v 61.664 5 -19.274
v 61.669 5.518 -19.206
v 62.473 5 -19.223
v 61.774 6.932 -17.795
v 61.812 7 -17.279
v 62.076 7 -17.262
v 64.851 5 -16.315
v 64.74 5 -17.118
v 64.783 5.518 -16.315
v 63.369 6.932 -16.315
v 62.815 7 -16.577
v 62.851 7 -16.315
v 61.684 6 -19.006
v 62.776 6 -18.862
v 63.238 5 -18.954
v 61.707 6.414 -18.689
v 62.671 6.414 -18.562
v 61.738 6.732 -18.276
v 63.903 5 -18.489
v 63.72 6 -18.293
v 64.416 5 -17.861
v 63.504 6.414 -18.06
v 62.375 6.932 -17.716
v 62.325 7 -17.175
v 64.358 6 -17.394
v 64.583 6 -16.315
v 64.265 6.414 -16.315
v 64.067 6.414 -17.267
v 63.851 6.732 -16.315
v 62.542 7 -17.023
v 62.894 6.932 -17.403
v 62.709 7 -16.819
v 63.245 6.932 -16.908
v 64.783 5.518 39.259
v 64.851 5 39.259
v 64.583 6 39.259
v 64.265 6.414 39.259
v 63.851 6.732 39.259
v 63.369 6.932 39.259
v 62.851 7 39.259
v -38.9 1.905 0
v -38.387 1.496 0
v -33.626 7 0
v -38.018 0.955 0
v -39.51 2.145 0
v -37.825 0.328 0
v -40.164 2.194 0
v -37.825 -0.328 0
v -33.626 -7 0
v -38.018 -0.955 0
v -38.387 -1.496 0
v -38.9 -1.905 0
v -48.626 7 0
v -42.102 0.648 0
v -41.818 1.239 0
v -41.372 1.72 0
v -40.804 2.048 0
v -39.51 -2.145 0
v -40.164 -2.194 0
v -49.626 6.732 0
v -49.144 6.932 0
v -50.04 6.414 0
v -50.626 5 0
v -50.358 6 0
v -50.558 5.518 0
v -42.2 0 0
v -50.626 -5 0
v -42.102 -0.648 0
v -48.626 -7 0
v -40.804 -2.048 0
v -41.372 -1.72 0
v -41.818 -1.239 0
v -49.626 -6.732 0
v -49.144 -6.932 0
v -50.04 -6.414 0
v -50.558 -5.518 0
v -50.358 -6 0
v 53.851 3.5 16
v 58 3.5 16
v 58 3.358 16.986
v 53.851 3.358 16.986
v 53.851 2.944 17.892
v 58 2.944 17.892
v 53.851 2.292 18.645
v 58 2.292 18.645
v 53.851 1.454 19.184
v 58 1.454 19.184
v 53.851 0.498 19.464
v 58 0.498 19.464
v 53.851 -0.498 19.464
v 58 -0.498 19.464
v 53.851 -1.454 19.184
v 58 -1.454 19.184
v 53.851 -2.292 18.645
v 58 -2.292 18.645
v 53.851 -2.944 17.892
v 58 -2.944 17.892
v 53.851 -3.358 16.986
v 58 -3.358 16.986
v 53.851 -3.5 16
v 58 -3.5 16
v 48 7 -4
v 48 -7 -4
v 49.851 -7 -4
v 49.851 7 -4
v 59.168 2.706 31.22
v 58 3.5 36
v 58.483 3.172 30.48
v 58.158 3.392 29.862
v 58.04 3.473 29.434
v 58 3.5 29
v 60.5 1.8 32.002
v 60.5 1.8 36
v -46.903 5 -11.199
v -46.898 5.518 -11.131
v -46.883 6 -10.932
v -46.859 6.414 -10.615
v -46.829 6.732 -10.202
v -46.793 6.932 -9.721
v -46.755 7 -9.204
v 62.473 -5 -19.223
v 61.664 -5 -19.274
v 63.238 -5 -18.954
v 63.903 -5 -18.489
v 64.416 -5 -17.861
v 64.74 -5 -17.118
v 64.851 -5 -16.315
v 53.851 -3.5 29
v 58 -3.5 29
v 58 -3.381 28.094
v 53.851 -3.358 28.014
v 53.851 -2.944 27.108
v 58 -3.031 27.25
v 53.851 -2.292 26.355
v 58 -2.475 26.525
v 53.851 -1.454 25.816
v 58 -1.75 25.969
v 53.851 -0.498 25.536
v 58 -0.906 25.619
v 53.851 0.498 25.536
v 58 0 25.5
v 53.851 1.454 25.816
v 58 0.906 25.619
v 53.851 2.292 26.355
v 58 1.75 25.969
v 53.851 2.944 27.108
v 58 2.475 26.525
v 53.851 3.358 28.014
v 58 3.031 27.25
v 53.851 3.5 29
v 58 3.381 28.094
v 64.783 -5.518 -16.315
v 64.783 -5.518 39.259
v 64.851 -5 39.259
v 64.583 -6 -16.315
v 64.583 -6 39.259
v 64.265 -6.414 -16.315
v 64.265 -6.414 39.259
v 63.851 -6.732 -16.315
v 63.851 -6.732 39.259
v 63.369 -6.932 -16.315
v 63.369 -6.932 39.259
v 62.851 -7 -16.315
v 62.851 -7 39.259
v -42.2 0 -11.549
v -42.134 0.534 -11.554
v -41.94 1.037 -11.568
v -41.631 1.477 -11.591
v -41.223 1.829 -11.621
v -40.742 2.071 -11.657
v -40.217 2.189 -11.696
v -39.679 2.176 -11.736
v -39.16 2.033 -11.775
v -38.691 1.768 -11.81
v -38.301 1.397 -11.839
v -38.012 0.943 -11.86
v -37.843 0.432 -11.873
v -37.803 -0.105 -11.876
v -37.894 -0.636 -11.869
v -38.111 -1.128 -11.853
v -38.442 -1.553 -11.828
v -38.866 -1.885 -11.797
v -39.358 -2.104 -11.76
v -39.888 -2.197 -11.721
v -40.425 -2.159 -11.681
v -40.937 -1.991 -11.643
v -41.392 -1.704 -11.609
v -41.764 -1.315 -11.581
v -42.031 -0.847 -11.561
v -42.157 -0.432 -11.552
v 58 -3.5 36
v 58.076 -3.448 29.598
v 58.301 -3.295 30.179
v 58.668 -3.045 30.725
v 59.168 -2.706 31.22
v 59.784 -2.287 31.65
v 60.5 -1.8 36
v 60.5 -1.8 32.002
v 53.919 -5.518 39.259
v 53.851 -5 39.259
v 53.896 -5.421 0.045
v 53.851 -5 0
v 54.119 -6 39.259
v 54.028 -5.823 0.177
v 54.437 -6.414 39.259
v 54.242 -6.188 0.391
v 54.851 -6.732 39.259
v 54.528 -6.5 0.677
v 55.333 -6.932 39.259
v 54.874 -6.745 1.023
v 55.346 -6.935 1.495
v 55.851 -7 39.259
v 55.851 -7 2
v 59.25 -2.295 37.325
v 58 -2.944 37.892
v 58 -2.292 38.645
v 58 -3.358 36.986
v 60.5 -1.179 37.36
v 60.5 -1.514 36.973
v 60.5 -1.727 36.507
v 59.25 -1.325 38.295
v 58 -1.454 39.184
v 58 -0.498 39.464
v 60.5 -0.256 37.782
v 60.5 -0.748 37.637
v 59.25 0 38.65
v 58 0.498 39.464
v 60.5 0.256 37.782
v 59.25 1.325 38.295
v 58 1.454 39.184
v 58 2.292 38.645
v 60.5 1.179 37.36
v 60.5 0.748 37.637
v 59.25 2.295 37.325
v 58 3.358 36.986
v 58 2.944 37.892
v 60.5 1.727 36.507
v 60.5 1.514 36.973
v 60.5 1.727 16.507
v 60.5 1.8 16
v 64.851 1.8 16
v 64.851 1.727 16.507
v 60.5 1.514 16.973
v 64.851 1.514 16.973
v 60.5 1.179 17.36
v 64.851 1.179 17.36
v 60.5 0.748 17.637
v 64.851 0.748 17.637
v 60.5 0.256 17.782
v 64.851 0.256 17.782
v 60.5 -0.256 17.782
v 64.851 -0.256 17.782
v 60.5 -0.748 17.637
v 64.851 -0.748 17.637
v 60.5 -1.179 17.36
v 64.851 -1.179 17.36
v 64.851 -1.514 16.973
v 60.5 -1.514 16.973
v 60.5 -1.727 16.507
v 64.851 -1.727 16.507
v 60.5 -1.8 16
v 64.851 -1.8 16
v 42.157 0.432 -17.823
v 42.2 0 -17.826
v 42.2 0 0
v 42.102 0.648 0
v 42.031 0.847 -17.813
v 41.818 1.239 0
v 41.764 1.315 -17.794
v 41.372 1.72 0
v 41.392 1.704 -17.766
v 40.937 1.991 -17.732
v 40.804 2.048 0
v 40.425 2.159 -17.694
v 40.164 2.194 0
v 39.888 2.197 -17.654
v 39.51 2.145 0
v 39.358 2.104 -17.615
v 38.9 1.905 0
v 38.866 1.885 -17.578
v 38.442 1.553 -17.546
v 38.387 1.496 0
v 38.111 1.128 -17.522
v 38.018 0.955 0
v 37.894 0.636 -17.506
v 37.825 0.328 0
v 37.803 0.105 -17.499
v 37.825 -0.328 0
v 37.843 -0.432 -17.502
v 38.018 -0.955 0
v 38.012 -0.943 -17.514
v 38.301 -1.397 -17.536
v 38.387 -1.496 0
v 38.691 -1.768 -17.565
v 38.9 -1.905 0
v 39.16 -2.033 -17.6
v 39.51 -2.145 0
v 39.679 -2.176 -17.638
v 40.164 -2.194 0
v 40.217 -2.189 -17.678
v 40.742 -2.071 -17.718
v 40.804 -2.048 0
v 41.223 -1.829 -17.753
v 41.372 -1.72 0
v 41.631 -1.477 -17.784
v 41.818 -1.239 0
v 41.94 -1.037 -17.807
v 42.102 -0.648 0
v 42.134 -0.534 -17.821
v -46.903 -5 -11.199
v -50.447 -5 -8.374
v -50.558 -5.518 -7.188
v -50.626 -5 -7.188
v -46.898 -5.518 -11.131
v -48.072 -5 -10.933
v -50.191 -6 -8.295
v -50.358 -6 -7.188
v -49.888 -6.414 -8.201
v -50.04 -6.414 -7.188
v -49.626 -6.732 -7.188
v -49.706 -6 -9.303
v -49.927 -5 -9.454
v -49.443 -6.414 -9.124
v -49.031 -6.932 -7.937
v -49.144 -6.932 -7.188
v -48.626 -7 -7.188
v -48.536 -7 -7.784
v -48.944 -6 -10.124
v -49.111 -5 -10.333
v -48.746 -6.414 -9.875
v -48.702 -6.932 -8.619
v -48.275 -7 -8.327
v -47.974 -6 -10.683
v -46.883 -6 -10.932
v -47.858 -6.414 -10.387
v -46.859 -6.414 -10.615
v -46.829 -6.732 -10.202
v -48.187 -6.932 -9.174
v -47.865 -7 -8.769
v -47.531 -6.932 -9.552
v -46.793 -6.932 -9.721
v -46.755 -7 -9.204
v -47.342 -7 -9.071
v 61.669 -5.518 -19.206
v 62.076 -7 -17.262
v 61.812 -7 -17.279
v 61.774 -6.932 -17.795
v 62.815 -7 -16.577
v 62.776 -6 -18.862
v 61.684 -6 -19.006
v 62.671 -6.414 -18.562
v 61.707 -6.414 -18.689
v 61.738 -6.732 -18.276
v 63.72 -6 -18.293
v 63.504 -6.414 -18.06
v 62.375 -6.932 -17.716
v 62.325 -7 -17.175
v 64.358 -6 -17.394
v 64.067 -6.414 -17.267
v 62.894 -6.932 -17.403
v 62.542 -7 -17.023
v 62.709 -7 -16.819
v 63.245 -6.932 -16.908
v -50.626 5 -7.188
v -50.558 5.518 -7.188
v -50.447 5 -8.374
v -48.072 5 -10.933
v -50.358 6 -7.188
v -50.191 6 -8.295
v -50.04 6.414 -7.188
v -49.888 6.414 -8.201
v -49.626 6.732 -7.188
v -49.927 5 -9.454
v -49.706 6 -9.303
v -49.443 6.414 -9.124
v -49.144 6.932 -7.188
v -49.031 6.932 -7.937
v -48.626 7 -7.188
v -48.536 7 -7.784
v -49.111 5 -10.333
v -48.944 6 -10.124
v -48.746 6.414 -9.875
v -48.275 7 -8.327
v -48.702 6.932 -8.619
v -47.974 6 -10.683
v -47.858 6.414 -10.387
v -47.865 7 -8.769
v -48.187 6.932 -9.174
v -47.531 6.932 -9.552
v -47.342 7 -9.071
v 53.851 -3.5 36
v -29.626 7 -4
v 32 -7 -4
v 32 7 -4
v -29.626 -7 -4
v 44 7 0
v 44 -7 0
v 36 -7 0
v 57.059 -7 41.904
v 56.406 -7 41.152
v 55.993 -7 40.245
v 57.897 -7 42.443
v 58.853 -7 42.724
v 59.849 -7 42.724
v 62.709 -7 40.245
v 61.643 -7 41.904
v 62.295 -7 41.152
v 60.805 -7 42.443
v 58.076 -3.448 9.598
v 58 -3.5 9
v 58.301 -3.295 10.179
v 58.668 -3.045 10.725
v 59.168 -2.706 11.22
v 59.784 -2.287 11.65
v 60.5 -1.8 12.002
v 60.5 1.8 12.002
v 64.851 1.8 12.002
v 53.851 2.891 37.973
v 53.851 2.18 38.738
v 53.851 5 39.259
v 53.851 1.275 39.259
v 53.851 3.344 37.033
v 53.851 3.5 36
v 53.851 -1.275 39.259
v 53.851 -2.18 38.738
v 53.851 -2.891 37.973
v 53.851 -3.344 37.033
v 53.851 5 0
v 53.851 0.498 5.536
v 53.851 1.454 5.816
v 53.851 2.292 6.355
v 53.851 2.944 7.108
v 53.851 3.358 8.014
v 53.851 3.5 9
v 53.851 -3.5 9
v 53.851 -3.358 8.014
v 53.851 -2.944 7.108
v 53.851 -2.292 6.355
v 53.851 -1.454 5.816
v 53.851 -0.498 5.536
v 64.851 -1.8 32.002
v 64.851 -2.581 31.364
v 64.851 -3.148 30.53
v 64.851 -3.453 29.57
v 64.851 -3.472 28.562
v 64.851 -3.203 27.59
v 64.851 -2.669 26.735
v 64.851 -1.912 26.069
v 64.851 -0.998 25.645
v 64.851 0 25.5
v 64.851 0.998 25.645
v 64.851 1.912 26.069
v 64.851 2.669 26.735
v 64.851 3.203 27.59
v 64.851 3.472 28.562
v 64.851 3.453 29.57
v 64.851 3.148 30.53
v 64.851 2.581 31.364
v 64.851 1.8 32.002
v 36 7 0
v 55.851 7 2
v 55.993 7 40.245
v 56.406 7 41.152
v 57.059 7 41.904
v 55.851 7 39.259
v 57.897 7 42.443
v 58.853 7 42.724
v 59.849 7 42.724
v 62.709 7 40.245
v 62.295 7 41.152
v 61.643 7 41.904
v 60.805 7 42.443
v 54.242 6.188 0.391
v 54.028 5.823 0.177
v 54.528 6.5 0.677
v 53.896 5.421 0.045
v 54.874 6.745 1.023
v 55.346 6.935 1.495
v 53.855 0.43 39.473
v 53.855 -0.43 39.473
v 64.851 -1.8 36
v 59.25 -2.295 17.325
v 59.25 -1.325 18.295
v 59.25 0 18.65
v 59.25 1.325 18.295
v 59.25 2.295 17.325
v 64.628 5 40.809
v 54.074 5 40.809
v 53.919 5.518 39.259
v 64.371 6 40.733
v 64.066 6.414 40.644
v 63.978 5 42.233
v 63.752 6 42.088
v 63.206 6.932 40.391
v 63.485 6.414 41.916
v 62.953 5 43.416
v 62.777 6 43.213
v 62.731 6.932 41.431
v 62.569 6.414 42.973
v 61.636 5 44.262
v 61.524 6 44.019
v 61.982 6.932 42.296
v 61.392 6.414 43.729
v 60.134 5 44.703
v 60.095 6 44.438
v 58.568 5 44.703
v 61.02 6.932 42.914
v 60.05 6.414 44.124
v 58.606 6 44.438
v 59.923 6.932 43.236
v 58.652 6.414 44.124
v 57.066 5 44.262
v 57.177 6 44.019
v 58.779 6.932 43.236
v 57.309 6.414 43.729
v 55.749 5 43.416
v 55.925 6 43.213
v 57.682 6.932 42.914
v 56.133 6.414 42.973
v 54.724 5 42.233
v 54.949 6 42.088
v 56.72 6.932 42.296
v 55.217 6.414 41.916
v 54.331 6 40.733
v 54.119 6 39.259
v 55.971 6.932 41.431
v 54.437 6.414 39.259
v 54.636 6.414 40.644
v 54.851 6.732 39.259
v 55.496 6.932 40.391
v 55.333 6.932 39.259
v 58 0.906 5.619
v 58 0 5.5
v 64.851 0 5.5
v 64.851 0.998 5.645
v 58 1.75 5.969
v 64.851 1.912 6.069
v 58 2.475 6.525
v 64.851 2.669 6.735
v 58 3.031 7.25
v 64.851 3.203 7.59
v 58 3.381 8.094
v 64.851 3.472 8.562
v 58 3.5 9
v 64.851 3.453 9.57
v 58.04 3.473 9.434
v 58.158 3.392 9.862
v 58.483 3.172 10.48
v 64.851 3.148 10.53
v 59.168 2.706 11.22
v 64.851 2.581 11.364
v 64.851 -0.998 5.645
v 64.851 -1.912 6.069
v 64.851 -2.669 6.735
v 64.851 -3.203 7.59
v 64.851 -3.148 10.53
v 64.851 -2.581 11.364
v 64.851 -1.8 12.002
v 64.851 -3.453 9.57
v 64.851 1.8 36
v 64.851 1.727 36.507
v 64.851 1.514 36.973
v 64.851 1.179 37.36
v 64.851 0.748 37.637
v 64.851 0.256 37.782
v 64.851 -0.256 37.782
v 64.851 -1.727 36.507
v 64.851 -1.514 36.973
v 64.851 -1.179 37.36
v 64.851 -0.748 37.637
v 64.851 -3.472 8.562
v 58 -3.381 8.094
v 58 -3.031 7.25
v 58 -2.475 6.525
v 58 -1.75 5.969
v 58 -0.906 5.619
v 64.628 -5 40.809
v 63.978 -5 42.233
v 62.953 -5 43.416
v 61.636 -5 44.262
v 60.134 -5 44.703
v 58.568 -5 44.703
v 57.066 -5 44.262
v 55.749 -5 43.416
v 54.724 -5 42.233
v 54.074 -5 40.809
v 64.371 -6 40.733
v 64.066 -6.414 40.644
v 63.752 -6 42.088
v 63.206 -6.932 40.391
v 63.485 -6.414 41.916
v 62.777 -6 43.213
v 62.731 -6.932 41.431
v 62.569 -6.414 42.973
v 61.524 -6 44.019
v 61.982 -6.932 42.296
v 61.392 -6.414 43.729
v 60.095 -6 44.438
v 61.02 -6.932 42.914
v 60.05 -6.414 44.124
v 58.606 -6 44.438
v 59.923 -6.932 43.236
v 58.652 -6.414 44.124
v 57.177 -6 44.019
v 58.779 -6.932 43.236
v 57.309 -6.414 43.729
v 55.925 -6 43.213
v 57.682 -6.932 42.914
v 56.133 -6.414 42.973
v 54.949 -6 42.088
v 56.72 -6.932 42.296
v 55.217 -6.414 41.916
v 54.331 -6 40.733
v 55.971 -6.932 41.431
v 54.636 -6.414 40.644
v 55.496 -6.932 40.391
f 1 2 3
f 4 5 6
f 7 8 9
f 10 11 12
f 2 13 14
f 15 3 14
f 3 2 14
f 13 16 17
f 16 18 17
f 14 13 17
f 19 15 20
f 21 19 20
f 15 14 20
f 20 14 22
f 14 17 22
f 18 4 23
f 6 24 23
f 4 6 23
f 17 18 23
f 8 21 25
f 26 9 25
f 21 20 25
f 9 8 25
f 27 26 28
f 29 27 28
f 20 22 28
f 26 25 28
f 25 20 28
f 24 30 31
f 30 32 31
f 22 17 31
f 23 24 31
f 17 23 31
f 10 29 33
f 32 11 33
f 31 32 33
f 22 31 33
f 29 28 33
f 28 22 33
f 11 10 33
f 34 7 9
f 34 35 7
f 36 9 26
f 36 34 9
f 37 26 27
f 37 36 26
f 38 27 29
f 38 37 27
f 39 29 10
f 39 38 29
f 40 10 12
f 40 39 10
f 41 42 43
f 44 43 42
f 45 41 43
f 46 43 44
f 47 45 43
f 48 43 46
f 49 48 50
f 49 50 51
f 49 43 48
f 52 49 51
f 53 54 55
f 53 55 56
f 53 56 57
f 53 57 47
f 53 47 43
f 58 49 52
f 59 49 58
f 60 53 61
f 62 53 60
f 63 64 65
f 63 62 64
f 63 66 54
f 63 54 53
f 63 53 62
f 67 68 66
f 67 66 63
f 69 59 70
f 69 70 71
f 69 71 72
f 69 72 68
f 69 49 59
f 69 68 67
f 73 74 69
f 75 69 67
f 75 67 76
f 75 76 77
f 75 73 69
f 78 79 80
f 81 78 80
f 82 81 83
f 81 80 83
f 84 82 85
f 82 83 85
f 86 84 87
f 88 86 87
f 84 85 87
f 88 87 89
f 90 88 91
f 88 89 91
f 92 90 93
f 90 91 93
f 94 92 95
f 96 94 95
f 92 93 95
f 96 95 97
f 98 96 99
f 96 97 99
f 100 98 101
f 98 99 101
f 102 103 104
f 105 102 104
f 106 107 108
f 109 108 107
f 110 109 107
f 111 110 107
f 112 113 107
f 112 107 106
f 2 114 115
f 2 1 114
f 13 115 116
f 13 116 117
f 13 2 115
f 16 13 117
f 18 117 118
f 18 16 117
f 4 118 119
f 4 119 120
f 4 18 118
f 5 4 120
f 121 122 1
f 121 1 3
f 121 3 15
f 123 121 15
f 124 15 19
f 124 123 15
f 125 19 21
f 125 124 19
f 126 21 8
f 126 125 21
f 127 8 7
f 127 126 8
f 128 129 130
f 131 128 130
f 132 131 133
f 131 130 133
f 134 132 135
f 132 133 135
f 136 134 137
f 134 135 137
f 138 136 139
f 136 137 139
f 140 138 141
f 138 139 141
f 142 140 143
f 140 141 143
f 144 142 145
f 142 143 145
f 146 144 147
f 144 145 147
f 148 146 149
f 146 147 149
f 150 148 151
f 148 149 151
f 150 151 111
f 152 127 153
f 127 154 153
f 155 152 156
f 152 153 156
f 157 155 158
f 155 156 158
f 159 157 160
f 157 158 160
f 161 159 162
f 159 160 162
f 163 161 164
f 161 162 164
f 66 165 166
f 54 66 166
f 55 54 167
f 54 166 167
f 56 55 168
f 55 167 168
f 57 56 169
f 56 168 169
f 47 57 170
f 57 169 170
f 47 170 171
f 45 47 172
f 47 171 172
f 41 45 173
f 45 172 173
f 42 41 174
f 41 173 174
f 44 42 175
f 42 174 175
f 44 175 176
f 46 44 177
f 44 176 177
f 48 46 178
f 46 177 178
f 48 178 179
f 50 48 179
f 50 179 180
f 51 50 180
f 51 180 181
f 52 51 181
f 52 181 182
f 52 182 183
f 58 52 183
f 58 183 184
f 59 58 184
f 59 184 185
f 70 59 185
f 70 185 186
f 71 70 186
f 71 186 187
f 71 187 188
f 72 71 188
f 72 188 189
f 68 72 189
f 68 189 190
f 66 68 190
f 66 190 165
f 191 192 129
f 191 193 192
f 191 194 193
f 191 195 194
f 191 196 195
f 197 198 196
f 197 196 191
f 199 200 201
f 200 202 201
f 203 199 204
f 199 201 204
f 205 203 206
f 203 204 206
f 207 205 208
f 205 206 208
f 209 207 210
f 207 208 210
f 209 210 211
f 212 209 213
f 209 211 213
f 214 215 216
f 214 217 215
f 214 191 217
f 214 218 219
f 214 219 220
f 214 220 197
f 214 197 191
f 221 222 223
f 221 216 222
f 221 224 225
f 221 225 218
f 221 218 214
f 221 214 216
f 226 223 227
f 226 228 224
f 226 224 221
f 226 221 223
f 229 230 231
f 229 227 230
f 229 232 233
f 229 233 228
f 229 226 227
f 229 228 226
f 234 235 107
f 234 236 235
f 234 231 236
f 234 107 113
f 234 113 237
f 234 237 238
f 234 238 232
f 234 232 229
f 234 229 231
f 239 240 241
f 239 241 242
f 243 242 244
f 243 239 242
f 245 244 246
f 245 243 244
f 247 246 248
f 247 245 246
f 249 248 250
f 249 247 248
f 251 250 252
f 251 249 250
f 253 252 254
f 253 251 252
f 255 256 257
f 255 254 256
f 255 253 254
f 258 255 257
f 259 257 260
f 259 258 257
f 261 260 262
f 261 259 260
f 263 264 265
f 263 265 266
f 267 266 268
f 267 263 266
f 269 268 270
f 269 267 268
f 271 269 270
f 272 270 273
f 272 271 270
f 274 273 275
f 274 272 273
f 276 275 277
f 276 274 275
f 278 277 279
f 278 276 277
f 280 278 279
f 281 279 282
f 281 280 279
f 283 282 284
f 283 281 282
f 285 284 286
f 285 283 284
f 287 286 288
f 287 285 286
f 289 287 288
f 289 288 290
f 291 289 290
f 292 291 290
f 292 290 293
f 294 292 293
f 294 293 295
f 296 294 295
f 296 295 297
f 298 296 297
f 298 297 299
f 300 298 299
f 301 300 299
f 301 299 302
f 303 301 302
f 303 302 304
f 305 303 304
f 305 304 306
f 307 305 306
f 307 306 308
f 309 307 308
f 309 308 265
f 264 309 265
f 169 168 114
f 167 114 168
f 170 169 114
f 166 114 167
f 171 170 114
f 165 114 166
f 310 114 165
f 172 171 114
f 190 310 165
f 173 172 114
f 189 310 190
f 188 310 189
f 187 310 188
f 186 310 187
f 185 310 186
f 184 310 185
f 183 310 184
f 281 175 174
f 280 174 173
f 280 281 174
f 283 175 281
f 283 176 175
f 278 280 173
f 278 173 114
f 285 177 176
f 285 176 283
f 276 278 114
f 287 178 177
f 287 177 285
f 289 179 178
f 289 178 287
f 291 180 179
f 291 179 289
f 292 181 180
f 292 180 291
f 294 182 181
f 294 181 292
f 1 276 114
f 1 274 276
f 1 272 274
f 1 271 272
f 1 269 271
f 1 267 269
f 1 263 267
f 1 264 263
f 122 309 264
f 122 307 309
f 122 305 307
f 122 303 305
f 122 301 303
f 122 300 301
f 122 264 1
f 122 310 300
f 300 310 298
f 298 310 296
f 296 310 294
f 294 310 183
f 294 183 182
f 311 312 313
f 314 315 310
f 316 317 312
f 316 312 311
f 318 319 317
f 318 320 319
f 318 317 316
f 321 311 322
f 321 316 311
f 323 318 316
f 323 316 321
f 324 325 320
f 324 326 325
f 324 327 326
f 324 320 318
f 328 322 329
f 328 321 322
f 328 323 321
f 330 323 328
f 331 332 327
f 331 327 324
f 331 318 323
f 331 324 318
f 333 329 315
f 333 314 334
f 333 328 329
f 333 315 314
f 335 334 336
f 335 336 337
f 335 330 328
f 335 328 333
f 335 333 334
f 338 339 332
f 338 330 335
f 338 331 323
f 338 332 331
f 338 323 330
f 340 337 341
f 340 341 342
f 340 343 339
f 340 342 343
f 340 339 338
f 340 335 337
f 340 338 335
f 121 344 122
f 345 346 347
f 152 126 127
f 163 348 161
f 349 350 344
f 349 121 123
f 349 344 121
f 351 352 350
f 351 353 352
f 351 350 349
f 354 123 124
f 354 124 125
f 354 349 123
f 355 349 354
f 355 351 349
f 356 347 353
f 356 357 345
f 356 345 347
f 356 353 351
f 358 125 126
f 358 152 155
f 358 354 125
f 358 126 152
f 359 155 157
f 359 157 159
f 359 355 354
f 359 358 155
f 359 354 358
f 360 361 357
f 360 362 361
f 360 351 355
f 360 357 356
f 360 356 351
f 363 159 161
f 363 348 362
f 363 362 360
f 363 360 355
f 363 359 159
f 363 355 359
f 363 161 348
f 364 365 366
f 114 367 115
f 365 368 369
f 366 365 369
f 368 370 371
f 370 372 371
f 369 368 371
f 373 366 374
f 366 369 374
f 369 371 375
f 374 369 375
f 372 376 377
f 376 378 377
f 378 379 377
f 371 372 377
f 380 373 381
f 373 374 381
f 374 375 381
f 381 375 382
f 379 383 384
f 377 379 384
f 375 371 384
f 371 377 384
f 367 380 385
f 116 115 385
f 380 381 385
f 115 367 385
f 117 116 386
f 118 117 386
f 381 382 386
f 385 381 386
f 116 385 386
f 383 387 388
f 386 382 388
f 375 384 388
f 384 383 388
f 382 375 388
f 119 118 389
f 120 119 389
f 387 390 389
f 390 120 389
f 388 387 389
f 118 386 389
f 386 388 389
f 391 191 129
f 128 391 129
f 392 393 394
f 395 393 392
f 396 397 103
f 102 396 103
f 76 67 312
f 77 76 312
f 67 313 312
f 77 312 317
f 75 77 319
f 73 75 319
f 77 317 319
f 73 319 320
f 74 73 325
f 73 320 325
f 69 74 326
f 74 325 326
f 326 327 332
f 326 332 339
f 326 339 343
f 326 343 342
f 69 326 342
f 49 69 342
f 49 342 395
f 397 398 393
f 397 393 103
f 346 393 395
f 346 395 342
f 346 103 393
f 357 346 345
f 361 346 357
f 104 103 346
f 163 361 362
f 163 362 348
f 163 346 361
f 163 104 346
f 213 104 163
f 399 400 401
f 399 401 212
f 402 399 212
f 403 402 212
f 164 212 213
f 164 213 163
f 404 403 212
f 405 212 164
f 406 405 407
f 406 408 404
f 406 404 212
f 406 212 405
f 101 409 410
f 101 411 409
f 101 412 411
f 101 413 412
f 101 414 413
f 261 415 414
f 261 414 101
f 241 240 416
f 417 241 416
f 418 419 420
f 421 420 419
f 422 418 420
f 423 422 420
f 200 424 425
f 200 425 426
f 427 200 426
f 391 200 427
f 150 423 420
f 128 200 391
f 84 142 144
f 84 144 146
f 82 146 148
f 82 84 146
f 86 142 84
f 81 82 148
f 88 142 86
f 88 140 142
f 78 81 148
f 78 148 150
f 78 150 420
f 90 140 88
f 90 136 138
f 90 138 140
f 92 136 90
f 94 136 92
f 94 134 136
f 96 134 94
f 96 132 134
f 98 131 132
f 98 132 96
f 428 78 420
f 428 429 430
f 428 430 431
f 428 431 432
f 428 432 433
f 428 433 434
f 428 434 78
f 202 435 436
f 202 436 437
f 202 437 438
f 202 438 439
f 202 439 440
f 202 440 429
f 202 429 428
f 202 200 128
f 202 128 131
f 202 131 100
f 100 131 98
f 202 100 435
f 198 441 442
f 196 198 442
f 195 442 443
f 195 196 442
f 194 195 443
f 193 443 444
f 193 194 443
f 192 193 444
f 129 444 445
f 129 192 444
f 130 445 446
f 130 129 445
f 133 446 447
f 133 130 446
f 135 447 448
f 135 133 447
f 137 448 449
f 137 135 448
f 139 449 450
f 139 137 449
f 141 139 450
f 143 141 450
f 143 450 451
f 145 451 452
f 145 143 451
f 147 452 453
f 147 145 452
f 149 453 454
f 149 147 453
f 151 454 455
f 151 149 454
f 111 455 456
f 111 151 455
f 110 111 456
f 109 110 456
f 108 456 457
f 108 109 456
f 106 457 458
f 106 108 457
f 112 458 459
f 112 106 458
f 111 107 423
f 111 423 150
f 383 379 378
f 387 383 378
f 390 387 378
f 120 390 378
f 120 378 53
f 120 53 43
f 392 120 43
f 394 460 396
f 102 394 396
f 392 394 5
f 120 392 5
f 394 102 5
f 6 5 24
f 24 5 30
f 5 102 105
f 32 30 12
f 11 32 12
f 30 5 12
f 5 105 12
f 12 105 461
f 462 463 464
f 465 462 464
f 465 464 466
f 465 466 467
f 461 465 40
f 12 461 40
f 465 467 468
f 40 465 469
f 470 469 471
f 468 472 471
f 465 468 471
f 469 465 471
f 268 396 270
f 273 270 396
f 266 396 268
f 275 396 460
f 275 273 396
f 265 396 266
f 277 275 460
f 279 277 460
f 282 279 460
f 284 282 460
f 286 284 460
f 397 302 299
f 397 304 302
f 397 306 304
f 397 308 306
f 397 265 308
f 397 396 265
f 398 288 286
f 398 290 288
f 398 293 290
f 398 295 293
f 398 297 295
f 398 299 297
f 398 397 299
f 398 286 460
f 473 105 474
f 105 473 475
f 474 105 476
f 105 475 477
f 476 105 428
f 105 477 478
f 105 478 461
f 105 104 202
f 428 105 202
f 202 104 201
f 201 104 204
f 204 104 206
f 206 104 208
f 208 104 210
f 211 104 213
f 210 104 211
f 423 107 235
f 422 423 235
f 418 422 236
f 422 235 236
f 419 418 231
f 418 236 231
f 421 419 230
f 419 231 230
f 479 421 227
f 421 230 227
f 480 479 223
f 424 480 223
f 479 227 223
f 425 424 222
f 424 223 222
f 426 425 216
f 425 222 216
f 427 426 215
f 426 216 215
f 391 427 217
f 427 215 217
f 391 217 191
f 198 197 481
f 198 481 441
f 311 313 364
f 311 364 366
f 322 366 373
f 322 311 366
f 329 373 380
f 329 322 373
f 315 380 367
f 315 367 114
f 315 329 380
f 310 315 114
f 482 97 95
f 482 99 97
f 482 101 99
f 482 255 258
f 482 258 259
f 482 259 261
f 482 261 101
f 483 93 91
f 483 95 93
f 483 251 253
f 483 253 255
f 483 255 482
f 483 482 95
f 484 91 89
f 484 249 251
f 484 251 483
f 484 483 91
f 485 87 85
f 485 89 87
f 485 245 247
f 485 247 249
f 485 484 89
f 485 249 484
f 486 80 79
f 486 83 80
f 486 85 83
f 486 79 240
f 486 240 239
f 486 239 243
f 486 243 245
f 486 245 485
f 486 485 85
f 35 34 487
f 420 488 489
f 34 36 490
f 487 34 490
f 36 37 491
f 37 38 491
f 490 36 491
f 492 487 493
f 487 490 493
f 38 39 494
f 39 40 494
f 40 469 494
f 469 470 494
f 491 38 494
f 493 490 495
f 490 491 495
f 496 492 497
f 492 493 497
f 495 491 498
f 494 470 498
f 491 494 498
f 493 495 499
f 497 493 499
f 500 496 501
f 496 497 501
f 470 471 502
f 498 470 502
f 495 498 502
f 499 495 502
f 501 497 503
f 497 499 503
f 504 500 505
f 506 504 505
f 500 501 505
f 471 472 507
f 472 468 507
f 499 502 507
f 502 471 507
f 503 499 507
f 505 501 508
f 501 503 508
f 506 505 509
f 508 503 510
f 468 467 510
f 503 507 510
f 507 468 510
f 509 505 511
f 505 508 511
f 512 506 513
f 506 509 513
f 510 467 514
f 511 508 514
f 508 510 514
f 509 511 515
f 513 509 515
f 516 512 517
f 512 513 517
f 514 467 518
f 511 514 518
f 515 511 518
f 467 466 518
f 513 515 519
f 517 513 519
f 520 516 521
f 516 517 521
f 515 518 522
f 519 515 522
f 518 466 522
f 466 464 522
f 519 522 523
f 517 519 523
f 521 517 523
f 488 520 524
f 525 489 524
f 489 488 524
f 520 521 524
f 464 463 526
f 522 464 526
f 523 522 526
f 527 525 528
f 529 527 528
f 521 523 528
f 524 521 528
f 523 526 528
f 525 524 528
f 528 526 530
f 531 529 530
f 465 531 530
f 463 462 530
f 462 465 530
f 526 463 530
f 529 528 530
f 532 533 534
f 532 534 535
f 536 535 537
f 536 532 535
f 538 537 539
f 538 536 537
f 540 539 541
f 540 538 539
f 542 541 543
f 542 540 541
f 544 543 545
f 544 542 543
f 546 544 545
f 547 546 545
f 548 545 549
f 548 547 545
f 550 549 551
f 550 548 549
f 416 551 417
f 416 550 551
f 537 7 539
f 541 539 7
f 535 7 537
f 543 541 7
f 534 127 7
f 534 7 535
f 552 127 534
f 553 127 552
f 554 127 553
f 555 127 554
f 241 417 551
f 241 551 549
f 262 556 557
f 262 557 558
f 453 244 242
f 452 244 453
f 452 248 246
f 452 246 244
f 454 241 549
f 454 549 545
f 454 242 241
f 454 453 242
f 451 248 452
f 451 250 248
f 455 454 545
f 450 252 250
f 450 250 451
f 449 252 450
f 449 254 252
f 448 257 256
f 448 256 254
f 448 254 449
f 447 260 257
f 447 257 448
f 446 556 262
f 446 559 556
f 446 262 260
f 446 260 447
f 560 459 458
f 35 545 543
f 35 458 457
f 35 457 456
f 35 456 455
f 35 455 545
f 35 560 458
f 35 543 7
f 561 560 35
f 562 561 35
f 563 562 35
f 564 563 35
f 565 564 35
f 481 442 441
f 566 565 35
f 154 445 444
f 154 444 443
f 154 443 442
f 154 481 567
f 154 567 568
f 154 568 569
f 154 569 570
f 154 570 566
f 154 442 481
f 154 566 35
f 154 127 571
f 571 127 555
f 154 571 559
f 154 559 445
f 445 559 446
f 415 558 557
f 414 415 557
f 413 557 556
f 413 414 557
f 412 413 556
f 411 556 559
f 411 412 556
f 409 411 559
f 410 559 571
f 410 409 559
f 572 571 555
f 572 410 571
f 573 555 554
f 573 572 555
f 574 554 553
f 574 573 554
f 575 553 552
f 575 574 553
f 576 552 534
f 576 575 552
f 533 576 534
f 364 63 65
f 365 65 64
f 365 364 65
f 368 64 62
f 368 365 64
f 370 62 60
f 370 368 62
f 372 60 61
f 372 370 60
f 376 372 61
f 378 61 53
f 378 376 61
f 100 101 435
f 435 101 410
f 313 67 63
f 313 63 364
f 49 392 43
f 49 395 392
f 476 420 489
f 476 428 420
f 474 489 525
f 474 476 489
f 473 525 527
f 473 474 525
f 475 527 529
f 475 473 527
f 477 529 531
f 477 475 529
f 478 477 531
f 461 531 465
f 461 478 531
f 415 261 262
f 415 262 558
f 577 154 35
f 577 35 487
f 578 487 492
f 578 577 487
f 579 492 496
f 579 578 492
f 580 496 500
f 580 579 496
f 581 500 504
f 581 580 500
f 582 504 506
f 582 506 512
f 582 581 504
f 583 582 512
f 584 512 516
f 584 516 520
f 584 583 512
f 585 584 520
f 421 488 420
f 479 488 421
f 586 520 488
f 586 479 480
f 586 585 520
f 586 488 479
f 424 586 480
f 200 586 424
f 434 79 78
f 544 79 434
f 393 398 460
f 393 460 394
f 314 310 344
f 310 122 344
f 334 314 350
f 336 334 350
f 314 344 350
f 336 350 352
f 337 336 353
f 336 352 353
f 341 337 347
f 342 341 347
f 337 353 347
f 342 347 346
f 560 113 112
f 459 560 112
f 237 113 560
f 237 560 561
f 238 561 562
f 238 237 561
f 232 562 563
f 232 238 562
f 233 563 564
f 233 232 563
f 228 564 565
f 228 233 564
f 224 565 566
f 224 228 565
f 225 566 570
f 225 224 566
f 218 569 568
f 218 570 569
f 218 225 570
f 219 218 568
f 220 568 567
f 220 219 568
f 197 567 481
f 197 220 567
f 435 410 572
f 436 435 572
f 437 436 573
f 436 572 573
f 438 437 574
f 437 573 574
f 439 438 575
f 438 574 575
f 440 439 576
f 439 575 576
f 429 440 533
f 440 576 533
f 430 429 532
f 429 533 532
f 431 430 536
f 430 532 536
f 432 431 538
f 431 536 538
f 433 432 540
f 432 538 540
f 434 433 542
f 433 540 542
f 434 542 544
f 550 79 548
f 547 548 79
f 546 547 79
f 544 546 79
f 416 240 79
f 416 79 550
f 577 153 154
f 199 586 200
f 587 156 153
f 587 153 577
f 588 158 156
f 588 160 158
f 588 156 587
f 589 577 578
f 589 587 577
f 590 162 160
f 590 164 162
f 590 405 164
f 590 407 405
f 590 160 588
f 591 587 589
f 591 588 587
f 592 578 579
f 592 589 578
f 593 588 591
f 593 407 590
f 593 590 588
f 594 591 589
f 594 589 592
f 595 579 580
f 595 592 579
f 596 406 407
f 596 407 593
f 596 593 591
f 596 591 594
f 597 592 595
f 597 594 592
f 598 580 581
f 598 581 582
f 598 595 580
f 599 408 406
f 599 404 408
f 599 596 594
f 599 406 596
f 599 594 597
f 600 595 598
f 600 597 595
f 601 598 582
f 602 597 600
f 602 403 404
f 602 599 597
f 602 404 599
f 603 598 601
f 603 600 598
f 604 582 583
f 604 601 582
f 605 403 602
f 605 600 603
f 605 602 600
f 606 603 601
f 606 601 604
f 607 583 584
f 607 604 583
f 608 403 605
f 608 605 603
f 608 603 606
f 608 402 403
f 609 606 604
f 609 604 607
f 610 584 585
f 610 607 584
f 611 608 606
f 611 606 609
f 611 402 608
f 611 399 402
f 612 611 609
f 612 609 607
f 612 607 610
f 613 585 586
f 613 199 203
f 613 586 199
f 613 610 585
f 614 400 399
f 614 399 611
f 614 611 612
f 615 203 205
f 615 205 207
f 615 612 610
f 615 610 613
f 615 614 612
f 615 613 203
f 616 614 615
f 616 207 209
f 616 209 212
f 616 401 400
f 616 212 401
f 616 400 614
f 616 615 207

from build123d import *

# Parameters (mm, degrees)
CYLINDER007_R             = 2.2
CYLINDER007_DEPTH         = 50
EXTRUDE007_DEPTH          = 10
EXTRUDE006_DEPTH          = 10
CYLINDER009_R             = 3.5
CYLINDER009_DEPTH         = 12.5
FUSION010_PLACEMENT_ANGLE = 90
ARRAY006_Z_COUNT          = 2
ARRAY006_Z_PITCH          = 20
EXTRUDE005_DEPTH          = 7
FILLET_R                  = 2


with BuildPart() as bolt_hole001:
    # Cylinder007 → Cylinder007 (new body)
    with BuildSketch(Plane(origin=(40, 0, -50), x_dir=(1, 0, 0), z_dir=(0, 0, 1))):
        Circle(CYLINDER007_R)
    extrude(amount=CYLINDER007_DEPTH)


with BuildPart() as screw_top_hole_sketch_extrude:
    # Sketch007 → Extrude007 (new body)
    with BuildSketch(Plane.XY):
        with BuildLine():
            Line((0, 3.5), (7, 3.5))
            ThreePointArc((7, -3.5), (10.5, 0), (7, 3.5))
            Line((0, -3.5), (7, -3.5))
            ThreePointArc((0, 3.5), (-3.5, 0), (0, -3.5))
        make_face()
    extrude(amount=-EXTRUDE007_DEPTH)


with BuildPart() as screw_hole_sketch_extrude:
    # Sketch008 → Extrude006 (new body)
    with BuildSketch(Plane.XY.offset(2.5)):
        with BuildLine():
            Line((0, 1.8), (7, 1.8))
            ThreePointArc((7, -1.8), (8.8, 0), (7, 1.8))
            Line((0, -1.8), (7, -1.8))
            ThreePointArc((0, 1.8), (-1.8, 0), (0, -1.8))
        make_face()
    extrude(amount=EXTRUDE006_DEPTH)


with BuildPart() as loft_body:
    # Sketch007 → Loft section 0
    with BuildSketch(Plane.XY):
        with BuildLine():
            Line((0, 3.5), (7, 3.5))
            ThreePointArc((7, -3.5), (10.5, 0), (7, 3.5))
            Line((0, -3.5), (7, -3.5))
            ThreePointArc((0, 3.5), (-3.5, 0), (0, -3.5))
        make_face()
    # Sketch008 → Loft section 1
    with BuildSketch(Plane.XY.offset(2.5)):
        with BuildLine():
            Line((0, 1.8), (7, 1.8))
            ThreePointArc((7, -1.8), (8.8, 0), (7, 1.8))
            Line((0, -1.8), (7, -1.8))
            ThreePointArc((0, 1.8), (-1.8, 0), (0, -1.8))
        make_face()
    loft(ruled=True)


with BuildPart() as screw_hole_array:
    # Cylinder009 → Cylinder009 (new body)
    with BuildSketch(Plane(origin=(7, 0, 0), x_dir=(1, 0, 0), z_dir=(0, 0, 1))):
        Circle(CYLINDER009_R)
    extrude(amount=CYLINDER009_DEPTH)

    # Fusion010: union screw top hole sketch extrude, screw hole sketch extrude, Loft body
    add(screw_top_hole_sketch_extrude.part)
    add(screw_hole_sketch_extrude.part)
    add(loft_body.part)


with BuildPart() as screw_hole_array_1:
    # Fusion010 placement: moved
    add(screw_hole_array.part.moved(Location((58, 0, 16))).rotate(Axis((58, 0, 16), (0, 1, 0)), FUSION010_PLACEMENT_ANGLE))

    # Array006 Z: screw hole array ×2


with BuildPart() as screw_hole_array_2:
    add(screw_hole_array_1.part)
    with Locations(*[(0, 0, i * ARRAY006_Z_PITCH) for i in range(1, ARRAY006_Z_COUNT)]):
        add(screw_hole_array_1.part)


with BuildPart() as hand_hole_fusion:
    # Part__Mirroring: instance of bolt hole001
    add(bolt_hole001.part.mirror(Plane(origin=(0, 0, 0), x_dir=(0, -1, 0), z_dir=(1, 0, 0))))

    # Fusion009: union bolt hole001, screw hole array
    add(bolt_hole001.part)
    add(screw_hole_array_2.part)


with BuildPart() as hand_cut:
    # Sketch006 → Extrude005 (new body, symmetric)
    with BuildSketch(Plane.XZ):
        with BuildLine():
            Line((-50.62624, 0), (-50.62624, -7.188247))
            ThreePointArc((-50.62624, -7.188247), (-49.551894, -9.924507), (-46.902857, -11.198844))
            Line((-46.902857, -11.198844), (61.663862, -19.273572))
            ThreePointArc((61.663862, -19.273572), (63.902574, -18.489156), (64.850876, -16.314792))
            Line((64.850876, -16.314792), (64.850876, 39.259367))
            ThreePointArc((64.850876, 39.259367), (59.350876, 44.759367), (53.850876, 39.259367))
            Line((53.850876, 39.259367), (53.850876, 0))
            Line((49.850876, -4), (53.850876, 0))
            Line((47.999662, -4), (49.850876, -4))
            Line((43.999662, 0), (47.999662, -4))
            Line((43.999662, 0), (35.999662, 0))
            Line((35.999662, 0), (31.999662, -4))
            Line((31.999662, -4), (-29.62624, -4))
            Line((-29.62624, -4), (-33.62624, 0))
            Line((-33.62624, 0), (-50.62624, 0))
        make_face()
    extrude(amount=EXTRUDE005_DEPTH, both=True)

    # Fillet
    fillet_edges = [hand_cut.edges().sort_by_distance(p)[0] for p in [
        (7.380503, 7, -15.236208),
        (7.380503, -7, -15.236208),
    ]]
    fillet(fillet_edges, radius=FILLET_R)

    # Cut011: cut hand hole fusion
    add(hand_hole_fusion.part, mode=Mode.SUBTRACT)


solid = hand_cut.part
